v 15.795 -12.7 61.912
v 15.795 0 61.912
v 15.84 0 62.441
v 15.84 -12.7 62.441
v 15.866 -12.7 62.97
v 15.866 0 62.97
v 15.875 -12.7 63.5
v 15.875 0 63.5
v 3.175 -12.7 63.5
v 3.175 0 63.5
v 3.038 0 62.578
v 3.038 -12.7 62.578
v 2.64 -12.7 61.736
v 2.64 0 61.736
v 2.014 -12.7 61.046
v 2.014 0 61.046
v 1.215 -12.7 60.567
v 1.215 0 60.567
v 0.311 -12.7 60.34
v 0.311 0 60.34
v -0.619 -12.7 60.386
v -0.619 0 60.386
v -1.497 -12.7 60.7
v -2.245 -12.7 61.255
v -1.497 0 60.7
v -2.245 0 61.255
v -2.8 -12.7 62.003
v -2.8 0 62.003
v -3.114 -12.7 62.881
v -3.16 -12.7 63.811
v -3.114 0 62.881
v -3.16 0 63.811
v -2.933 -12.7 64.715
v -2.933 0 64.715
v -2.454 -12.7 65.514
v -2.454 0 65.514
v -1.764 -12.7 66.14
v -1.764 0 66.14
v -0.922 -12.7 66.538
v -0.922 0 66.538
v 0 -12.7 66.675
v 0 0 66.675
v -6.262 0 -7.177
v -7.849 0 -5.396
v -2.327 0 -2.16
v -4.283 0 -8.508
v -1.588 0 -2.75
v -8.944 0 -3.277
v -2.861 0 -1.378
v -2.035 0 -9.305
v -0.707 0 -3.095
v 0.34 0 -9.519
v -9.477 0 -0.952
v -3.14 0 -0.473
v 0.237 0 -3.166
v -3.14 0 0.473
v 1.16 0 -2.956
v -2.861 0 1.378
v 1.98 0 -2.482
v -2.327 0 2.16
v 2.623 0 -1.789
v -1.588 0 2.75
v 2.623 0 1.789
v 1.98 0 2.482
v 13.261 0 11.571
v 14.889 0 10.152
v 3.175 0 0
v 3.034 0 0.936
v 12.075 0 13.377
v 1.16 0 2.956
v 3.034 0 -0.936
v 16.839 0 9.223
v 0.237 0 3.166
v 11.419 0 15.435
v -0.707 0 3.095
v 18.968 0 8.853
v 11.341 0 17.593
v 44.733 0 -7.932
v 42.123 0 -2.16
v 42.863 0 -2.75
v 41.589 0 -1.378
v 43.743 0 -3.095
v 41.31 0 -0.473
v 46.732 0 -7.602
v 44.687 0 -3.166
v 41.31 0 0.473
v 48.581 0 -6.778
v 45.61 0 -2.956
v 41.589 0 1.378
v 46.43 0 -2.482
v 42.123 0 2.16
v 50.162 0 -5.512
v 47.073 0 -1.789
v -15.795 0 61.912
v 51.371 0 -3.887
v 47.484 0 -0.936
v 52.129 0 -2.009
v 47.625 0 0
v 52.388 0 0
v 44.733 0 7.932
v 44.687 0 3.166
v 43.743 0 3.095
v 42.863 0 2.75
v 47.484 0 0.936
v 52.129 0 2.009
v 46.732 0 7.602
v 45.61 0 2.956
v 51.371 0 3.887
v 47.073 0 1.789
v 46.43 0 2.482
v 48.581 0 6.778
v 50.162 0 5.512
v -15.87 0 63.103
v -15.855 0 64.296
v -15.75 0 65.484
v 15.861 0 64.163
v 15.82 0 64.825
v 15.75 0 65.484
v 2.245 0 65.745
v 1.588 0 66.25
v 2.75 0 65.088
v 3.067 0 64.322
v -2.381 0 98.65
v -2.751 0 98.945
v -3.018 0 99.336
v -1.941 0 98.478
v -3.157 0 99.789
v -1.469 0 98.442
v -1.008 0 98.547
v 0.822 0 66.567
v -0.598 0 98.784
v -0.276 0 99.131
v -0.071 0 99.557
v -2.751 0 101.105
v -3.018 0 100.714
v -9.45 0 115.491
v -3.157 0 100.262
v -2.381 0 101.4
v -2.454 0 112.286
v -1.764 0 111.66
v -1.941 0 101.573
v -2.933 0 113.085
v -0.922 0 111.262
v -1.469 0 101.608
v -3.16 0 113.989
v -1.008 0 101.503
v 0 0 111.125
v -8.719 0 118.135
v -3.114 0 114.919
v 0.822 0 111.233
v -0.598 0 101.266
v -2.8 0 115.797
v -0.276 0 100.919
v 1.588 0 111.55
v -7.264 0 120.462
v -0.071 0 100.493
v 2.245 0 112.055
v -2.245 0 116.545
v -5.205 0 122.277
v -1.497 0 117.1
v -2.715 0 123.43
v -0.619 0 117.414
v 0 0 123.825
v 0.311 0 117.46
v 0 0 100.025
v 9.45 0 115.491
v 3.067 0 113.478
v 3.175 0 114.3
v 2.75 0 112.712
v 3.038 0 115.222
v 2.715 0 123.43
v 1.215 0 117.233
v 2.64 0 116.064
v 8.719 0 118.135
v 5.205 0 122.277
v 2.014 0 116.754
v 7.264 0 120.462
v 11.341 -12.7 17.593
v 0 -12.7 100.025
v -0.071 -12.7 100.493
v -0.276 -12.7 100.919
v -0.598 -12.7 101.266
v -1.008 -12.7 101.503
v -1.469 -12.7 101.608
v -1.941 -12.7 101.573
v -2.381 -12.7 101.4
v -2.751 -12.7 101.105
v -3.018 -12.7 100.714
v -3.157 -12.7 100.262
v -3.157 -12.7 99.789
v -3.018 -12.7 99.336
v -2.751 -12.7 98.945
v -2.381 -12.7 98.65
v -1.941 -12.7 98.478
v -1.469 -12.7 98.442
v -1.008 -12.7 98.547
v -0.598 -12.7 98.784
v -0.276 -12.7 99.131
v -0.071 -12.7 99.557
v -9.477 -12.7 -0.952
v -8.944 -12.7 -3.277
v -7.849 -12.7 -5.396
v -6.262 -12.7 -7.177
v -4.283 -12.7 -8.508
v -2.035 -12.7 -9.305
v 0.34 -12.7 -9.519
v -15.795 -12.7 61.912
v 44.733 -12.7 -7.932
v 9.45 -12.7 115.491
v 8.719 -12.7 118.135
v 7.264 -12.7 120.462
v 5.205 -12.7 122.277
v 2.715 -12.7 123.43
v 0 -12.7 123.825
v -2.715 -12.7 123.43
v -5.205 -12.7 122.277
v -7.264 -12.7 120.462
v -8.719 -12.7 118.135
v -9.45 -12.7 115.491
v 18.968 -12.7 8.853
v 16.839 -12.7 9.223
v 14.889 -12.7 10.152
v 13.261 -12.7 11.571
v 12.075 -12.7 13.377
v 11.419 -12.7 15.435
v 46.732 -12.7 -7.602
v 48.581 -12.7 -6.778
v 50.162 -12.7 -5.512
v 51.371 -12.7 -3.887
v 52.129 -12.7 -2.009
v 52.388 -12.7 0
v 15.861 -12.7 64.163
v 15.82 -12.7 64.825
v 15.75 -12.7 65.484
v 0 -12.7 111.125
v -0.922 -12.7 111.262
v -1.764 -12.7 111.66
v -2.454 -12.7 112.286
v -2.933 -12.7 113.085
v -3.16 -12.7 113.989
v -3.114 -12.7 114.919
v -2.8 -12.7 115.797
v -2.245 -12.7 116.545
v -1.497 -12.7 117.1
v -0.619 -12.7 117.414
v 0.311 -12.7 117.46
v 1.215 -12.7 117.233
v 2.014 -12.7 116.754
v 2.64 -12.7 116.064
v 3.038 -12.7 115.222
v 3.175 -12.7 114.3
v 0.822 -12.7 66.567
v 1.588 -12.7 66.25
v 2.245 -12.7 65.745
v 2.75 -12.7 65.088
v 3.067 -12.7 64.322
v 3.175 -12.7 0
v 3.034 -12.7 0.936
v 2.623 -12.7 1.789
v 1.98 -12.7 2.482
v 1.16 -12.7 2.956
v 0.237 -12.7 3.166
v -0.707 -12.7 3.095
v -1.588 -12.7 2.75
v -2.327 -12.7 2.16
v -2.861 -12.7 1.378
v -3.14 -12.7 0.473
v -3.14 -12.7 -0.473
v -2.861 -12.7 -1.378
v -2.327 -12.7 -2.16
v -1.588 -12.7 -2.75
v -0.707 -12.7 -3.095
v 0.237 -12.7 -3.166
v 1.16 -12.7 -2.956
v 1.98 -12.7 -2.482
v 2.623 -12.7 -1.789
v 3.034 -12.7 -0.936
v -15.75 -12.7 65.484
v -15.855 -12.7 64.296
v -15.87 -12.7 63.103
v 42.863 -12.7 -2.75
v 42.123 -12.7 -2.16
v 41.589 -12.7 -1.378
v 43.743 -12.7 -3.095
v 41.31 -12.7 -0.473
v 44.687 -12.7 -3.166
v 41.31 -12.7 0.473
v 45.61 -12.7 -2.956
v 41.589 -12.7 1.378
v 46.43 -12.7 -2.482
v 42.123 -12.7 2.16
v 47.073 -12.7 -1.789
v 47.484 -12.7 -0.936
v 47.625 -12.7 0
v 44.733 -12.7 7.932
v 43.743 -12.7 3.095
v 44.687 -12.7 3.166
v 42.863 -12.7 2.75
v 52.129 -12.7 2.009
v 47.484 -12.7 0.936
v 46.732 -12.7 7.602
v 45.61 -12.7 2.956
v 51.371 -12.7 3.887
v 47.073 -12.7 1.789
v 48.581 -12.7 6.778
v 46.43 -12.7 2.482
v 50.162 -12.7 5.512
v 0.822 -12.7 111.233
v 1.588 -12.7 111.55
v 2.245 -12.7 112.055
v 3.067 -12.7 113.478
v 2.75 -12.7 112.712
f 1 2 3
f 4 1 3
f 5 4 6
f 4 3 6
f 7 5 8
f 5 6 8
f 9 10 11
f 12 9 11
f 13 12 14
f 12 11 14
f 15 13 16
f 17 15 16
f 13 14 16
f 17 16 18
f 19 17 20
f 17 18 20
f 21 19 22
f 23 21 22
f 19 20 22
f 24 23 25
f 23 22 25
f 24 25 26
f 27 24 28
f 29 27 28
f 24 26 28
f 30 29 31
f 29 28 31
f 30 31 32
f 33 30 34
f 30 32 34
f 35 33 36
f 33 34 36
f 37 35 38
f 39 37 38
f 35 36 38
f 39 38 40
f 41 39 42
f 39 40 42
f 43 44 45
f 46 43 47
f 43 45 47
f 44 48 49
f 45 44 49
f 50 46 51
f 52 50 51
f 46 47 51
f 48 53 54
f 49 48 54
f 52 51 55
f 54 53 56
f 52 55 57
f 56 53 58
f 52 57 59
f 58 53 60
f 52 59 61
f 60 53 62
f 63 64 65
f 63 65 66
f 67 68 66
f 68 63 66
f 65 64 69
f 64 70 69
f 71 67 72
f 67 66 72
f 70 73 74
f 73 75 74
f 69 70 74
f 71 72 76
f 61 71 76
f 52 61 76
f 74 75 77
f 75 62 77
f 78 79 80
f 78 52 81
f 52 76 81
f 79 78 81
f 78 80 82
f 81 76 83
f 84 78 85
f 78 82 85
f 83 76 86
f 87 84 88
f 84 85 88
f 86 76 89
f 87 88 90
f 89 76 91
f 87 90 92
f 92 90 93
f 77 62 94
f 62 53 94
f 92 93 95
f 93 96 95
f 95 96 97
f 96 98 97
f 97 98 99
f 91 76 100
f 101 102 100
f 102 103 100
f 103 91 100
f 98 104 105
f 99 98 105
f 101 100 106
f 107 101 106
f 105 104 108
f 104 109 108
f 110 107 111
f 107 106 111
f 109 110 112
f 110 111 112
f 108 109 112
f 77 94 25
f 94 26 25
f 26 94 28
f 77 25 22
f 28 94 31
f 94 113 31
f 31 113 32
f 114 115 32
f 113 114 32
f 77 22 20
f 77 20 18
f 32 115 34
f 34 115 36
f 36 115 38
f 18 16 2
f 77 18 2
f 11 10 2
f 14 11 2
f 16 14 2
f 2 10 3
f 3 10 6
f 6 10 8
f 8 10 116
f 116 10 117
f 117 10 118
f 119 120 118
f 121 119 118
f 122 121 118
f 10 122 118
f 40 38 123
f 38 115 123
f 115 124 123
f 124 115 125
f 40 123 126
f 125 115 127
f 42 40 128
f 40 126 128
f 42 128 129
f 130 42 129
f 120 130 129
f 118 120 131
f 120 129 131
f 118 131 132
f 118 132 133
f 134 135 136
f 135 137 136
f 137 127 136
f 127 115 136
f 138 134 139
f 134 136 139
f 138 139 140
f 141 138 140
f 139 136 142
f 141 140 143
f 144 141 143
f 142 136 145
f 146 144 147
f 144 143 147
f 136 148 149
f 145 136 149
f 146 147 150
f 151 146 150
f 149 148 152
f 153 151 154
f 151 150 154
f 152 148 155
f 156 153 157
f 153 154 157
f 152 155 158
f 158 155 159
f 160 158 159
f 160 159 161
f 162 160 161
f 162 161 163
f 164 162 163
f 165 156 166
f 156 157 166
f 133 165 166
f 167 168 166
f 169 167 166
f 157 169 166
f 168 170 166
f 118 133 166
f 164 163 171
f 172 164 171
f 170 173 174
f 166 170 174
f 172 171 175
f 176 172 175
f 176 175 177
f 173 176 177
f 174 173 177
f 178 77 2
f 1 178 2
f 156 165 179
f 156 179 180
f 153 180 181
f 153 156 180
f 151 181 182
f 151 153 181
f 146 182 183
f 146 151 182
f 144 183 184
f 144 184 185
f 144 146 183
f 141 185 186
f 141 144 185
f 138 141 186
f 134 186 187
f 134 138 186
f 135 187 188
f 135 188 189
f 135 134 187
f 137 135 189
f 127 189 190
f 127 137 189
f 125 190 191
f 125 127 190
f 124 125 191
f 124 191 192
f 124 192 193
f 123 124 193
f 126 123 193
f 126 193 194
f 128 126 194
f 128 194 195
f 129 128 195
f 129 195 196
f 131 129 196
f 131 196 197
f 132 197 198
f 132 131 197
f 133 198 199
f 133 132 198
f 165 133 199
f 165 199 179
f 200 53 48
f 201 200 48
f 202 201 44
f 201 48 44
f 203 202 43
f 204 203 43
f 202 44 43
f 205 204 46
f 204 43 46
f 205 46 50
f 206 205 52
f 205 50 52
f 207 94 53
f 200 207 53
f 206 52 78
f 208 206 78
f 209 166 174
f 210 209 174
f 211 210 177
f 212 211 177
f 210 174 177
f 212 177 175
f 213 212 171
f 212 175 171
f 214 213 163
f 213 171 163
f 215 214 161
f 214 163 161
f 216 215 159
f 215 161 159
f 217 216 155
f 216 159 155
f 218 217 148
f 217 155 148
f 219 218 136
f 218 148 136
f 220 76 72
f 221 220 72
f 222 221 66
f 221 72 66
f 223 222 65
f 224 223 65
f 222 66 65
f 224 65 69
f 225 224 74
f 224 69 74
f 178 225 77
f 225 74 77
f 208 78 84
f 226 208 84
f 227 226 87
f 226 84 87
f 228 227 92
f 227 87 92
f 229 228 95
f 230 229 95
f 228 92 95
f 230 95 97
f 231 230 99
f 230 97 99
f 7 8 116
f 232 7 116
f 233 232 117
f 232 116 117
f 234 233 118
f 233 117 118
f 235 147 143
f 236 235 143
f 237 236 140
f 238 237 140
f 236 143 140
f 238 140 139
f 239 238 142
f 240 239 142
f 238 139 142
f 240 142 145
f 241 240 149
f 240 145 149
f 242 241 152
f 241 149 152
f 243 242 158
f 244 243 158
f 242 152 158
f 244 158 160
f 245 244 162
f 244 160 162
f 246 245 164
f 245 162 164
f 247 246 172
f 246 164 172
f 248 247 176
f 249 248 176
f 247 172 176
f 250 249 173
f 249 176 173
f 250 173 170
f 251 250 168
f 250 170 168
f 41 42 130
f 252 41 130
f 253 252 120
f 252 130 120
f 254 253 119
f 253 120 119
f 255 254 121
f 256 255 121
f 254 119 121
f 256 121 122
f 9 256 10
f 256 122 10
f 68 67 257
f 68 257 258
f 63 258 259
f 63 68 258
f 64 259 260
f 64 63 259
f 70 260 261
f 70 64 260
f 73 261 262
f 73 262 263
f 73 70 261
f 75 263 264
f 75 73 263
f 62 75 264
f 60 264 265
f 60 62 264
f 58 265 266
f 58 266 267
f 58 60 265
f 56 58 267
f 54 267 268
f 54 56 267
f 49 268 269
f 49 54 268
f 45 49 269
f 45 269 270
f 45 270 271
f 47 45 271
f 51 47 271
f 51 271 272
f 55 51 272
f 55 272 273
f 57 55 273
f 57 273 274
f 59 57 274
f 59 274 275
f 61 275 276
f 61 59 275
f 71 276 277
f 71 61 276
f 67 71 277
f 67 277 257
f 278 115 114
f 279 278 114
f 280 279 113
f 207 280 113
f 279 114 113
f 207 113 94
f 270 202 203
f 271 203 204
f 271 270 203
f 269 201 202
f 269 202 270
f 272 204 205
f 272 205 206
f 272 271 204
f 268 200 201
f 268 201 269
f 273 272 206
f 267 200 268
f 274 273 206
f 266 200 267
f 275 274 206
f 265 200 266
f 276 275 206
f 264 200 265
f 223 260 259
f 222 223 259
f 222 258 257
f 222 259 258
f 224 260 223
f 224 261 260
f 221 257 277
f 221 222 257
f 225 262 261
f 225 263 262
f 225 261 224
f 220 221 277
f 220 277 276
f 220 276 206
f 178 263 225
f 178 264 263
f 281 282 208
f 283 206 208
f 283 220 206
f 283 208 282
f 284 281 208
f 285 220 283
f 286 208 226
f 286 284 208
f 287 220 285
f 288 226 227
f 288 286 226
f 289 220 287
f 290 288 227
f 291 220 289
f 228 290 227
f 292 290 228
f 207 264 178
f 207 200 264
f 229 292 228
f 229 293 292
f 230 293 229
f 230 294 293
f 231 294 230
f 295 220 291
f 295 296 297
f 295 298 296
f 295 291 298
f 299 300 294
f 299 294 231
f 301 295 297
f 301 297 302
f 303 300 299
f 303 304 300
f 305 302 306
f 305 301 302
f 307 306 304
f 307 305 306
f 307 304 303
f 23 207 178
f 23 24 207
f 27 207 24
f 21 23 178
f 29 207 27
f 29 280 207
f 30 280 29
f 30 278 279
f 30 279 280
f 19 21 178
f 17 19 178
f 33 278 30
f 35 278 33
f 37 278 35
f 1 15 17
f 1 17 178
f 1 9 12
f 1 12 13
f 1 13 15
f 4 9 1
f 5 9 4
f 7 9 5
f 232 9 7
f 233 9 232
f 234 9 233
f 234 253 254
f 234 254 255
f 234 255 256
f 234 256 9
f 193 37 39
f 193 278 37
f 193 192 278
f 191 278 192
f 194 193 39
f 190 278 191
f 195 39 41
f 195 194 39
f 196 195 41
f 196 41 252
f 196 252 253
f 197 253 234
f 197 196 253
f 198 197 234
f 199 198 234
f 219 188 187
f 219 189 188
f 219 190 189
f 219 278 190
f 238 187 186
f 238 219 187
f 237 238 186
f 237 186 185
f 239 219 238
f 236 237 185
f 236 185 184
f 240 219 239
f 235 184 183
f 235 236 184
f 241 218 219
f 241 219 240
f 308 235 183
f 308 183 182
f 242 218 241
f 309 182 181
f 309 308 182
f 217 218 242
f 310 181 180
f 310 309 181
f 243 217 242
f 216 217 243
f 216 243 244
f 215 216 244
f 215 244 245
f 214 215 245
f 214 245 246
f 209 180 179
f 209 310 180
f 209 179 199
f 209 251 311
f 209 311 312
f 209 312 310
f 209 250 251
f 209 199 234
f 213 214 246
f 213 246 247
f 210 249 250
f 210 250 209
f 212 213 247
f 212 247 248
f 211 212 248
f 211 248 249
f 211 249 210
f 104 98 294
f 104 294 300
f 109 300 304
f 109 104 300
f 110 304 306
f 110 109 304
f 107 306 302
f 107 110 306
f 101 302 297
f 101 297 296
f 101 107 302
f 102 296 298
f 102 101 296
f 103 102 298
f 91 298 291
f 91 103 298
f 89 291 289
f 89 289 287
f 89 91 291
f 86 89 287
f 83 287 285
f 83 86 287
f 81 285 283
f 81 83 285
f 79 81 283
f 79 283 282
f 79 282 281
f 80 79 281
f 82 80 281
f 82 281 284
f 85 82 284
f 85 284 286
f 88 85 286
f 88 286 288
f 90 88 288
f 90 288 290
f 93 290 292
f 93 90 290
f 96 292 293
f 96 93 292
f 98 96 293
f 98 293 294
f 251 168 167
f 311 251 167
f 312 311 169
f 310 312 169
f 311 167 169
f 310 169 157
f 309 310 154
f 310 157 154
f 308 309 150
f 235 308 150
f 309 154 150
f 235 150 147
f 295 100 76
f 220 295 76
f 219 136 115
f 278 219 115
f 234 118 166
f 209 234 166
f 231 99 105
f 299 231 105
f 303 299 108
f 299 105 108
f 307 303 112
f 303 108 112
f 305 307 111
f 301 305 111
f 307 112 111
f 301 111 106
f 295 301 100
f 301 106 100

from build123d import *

# Parameters (mm, degrees)
F0_R     = 3.175
F1_DEPTH = 12.7
F0_R_2   = 1.5875


with BuildPart() as f1:
    # F0 (on Front) → F1 (new body)
    with BuildSketch(Plane.XZ):
        with Locations((-96.8591794372, -59.9242933095)):
            Circle(F0_R)
    extrude(amount=F1_DEPTH)


with BuildPart() as f1b:
    # F0 (on Front) → F1, piece 2 (new body)
    with BuildSketch(Plane.XZ):
        with BuildLine():
            ThreePointArc((9.525, 0), (-0.4768479324, 9.5130563464), (-9.4772553384, -0.9525))
            ThreePointArc((-9.4772553384, -0.9525), (-6.2623833816, -7.1769199091), (0.3401785714, -9.5189234444))
            ThreePointArc((0.3401785714, -9.5189234444), (6.8544082857, -6.6138273378), (9.525, 0))
        make_face()
        Circle(F0_R, mode=Mode.SUBTRACT)
        with BuildLine():
            ThreePointArc((52.3875, 0), (50.1620069047, 5.5115227815), (44.7334821429, 7.9324362036))
            ThreePointArc((44.7334821429, 7.9324362036), (36.5125, 0), (44.7334821429, -7.9324362036))
            ThreePointArc((44.7334821429, -7.9324362036), (50.1620069047, -5.5115227815), (52.3875, 0))
        make_face()
        with Locations((44.45, 0)):
            Circle(F0_R, mode=Mode.SUBTRACT)
        with BuildLine():
            Line((11.3411865923, 17.5933818124), (15.7954255641, 61.9125))
            ThreePointArc((15.7954255641, 61.9125), (0, 47.625), (-15.7954255641, 61.9125))
            Line((-15.7954255641, 61.9125), (-9.4772553384, -0.9525))
            ThreePointArc((-9.4772553384, -0.9525), (-0.4768479324, 9.5130563464), (9.525, 0))
            ThreePointArc((9.525, 0), (6.8544082857, -6.6138273378), (0.3401785714, -9.5189234444))
            Line((0.3401785714, -9.5189234444), (44.7334821429, -7.9324362036))
            ThreePointArc((44.7334821429, -7.9324362036), (36.5125, 0), (44.7334821429, 7.9324362036))
            Line((44.7334821429, 7.9324362036), (18.9676000005, 8.8532337108))
            ThreePointArc((18.9676000005, 8.8532337108), (13.2611998974, 11.5713591498), (11.3411865923, 17.5933818124))
        make_face()
        with BuildLine():
            ThreePointArc((0, 79.375), (10.5003255158, 75.40625), (15.7504882737, 65.484375))
            Line((15.7504882737, 65.484375), (9.4502929642, 115.490625))
            ThreePointArc((9.4502929642, 115.490625), (9.5063048942, 114.896483242), (9.525, 114.3))
            ThreePointArc((9.525, 114.3), (6.7351920908, 107.5648079092), (0, 104.775))
            Line((0, 104.775), (0, 100.0252))
            Line((0, 100.0252), (0, 79.375))
        make_face()
        with BuildLine():
            ThreePointArc((9.525, 114.3), (9.5063048942, 114.896483242), (9.4502929642, 115.490625))
            ThreePointArc((9.4502929642, 115.490625), (0, 123.825), (-9.4502929642, 115.490625))
            ThreePointArc((-9.4502929642, 115.490625), (-7.14375, 107.9998046905), (0, 104.775))
            ThreePointArc((0, 104.775), (6.7351920908, 107.5648079092), (9.525, 114.3))
        make_face()
        with BuildLine():
            ThreePointArc((3.175, 114.3), (2.2450640303, 112.0549359697), (0, 111.125))
            ThreePointArc((0, 111.125), (-2.2450640303, 116.5450640303), (3.175, 114.3))
        make_face(mode=Mode.SUBTRACT)
        with BuildLine():
            ThreePointArc((15.7954255641, 61.9125), (15.8550939106, 62.7052534459), (15.875, 63.5))
            ThreePointArc((15.875, 63.5), (15.8438414904, 64.4941387366), (15.7504882737, 65.484375))
            ThreePointArc((15.7504882737, 65.484375), (10.5003255158, 75.40625), (0, 79.375))
            ThreePointArc((0, 79.375), (-10.5003255158, 75.40625), (-15.7504882737, 65.484375))
            ThreePointArc((-15.7504882737, 65.484375), (-15.8737438155, 63.6997054867), (-15.7954255641, 61.9125))
            ThreePointArc((-15.7954255641, 61.9125), (0, 47.625), (15.7954255641, 61.9125))
        make_face()
        with BuildLine():
            ThreePointArc((3.175, 63.5), (-2.2450640303, 61.2549359697), (0, 66.675))
            ThreePointArc((0, 66.675), (2.2450640303, 65.7450640303), (3.175, 63.5))
        make_face(mode=Mode.SUBTRACT)
        with BuildLine():
            ThreePointArc((-15.7504882737, 65.484375), (-10.5003255158, 75.40625), (0, 79.375))
            Line((0, 79.375), (0, 100.0252))
            Line((0, 100.0252), (0, 104.775))
            ThreePointArc((0, 104.775), (-7.14375, 107.9998046905), (-9.4502929642, 115.490625))
            Line((-9.4502929642, 115.490625), (-15.7504882737, 65.484375))
        make_face()
        with Locations((-1.5875, 100.0252)):
            Circle(F0_R_2, mode=Mode.SUBTRACT)
    extrude(amount=F1_DEPTH)


solid = f1b.part
